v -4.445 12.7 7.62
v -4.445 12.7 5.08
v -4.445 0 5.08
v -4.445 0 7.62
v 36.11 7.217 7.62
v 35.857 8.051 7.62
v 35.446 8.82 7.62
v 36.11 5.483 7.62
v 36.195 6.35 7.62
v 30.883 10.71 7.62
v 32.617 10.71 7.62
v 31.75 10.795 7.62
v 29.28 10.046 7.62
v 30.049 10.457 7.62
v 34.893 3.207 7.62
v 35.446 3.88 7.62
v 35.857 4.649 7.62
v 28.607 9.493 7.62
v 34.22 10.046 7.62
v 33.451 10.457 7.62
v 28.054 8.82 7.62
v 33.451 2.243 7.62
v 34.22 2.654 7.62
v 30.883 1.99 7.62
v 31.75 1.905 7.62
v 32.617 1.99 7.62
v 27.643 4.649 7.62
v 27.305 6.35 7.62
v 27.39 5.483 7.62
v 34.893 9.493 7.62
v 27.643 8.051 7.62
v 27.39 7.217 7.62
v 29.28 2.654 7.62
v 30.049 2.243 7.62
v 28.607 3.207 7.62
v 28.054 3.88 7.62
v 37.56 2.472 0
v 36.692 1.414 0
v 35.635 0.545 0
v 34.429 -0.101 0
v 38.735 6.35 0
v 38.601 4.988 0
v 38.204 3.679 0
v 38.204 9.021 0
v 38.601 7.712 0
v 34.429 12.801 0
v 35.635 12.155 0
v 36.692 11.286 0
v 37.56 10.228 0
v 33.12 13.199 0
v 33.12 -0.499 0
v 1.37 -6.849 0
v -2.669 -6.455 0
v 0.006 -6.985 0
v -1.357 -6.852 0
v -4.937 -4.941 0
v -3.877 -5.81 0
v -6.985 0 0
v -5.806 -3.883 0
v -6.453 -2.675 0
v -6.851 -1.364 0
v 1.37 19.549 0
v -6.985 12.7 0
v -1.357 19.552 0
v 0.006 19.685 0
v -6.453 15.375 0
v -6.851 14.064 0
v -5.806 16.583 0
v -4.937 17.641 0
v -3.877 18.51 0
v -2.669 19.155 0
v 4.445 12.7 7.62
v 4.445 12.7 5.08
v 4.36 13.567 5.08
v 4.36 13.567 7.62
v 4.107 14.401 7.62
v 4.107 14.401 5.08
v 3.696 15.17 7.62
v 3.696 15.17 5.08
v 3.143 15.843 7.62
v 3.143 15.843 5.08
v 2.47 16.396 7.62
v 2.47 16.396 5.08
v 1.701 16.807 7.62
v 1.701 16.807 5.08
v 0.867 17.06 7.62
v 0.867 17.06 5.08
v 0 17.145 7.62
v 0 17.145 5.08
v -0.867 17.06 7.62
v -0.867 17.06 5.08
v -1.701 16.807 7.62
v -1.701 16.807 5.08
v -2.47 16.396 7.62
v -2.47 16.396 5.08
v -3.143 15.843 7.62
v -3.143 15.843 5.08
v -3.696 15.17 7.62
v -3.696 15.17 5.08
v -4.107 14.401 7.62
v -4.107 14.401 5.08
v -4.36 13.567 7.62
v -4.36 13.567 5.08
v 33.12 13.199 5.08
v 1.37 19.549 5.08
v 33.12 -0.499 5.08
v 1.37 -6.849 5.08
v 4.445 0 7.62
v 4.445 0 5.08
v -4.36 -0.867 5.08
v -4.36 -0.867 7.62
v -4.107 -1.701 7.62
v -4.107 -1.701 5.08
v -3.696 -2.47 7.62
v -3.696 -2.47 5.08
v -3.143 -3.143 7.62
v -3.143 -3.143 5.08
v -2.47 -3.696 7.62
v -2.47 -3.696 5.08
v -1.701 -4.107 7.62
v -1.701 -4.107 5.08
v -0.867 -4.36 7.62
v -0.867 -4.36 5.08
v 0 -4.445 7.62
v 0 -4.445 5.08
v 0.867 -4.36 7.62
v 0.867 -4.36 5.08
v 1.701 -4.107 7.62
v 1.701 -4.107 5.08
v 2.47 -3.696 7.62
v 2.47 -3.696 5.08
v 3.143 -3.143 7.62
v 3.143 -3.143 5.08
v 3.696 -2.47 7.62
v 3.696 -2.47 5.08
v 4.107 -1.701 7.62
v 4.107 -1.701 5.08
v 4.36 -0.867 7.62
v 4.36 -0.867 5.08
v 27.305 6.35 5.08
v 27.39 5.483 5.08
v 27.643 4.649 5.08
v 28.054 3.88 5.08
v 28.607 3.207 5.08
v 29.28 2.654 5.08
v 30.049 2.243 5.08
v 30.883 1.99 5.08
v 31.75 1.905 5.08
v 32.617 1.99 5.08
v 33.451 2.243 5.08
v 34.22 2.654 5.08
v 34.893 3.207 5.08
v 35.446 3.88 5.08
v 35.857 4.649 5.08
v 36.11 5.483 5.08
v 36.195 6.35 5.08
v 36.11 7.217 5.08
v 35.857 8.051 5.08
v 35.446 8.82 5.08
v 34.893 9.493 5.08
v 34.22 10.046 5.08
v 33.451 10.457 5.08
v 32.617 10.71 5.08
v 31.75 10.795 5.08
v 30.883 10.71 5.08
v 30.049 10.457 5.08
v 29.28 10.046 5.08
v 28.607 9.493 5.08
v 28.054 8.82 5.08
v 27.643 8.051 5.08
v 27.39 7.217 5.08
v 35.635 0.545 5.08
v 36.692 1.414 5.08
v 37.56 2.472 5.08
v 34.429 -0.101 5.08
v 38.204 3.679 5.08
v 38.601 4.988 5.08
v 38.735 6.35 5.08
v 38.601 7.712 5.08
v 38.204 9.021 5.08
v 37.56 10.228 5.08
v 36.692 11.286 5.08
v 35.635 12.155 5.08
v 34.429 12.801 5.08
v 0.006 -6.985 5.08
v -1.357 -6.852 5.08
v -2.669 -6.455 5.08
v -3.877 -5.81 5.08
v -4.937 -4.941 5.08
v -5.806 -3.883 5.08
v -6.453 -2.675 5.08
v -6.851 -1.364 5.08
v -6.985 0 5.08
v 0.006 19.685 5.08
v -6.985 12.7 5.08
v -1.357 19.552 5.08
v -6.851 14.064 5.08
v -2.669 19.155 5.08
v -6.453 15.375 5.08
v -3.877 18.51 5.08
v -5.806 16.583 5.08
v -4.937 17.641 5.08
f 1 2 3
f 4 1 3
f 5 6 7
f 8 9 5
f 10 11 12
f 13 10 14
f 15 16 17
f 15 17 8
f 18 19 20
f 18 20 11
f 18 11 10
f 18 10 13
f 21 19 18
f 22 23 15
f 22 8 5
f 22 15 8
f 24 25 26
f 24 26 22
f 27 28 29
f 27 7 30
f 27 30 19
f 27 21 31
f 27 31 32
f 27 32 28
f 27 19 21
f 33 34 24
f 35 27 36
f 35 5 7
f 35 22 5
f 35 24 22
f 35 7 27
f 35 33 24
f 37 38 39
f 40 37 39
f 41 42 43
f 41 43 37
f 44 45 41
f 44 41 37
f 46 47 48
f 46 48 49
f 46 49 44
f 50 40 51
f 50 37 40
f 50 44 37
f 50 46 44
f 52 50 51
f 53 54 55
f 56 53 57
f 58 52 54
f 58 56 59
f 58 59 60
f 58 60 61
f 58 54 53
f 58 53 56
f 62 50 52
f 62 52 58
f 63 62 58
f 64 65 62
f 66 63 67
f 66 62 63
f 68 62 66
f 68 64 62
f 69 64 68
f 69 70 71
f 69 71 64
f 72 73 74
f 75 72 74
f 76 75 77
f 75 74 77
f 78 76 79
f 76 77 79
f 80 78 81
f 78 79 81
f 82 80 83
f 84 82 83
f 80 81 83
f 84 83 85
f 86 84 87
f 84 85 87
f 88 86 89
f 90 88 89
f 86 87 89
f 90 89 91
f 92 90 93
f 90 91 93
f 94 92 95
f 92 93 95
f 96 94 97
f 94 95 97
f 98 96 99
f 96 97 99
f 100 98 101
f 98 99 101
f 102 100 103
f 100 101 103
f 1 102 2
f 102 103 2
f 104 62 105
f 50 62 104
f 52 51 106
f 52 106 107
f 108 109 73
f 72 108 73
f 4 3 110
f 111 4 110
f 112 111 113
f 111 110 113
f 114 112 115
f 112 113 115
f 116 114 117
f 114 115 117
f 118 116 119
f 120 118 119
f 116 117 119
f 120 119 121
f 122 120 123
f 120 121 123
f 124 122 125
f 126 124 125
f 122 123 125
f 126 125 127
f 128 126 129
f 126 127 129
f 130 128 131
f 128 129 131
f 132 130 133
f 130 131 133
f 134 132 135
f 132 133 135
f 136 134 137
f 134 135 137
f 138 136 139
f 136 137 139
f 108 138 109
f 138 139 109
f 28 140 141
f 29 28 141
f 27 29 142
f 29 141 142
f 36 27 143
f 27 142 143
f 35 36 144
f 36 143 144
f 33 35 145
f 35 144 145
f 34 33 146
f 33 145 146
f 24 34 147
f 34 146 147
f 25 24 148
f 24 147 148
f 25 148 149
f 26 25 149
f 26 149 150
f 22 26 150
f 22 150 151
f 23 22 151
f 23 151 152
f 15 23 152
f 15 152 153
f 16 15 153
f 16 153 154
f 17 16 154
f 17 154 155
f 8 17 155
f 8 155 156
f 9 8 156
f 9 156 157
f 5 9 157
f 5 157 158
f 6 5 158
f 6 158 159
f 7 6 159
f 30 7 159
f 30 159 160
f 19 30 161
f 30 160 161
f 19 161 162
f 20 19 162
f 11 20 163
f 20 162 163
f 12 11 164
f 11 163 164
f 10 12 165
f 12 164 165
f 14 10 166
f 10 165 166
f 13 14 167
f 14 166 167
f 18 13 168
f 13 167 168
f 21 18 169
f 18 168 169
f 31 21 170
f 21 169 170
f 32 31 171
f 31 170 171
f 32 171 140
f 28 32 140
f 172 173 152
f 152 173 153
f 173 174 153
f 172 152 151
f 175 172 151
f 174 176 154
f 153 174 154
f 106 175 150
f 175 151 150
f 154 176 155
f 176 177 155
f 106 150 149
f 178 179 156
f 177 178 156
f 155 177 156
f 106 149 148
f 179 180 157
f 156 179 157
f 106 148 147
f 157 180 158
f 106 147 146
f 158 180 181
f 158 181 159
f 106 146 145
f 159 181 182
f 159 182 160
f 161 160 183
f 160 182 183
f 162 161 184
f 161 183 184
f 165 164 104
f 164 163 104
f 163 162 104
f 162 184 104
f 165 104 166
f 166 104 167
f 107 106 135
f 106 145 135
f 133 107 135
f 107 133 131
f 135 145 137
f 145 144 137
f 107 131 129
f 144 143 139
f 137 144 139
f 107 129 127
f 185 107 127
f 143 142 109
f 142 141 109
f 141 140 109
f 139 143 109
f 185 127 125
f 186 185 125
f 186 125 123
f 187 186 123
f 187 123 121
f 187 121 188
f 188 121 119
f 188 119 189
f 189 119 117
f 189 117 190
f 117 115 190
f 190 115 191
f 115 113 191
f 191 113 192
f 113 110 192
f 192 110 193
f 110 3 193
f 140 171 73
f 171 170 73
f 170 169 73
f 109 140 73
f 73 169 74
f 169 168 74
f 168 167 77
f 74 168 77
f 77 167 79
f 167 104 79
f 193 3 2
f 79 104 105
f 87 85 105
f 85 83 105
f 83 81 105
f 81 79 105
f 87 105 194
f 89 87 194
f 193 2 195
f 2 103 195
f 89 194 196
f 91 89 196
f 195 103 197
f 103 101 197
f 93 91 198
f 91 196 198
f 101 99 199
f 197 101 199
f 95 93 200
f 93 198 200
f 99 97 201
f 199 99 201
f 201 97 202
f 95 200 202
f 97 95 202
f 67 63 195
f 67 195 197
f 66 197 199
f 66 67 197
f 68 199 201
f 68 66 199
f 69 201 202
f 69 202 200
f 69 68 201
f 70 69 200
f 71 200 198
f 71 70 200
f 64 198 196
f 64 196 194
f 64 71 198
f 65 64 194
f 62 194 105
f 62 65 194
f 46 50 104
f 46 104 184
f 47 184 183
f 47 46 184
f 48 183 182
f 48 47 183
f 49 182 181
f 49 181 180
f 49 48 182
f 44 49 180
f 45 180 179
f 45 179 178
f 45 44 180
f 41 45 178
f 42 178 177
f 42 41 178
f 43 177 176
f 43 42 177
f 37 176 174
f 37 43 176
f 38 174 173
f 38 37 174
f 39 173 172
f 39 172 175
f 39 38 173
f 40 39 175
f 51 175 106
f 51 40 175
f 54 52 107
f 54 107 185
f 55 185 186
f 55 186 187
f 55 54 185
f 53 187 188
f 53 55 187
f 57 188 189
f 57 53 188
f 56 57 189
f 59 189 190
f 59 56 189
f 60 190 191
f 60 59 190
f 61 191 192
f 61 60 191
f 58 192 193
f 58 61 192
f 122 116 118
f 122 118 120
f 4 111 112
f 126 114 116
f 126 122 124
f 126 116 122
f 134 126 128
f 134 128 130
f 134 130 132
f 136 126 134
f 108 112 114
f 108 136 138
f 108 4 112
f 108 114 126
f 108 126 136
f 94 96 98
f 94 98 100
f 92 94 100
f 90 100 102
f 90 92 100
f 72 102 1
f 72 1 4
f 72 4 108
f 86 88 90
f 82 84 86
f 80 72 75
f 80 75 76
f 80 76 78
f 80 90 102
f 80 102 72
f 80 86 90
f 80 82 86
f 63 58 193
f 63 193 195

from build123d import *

# Parameters (mm, degrees)
SKETCH1_R           = 4.445
BOSS_EXTRUDE1_DEPTH = 5.08
SKETCH1_8_R         = 4.445
BOSS_EXTRUDE2_DEPTH = 7.62


with BuildPart() as part:
    # Sketch1 → Boss-Extrude1 (new body)
    with BuildSketch(Plane.XY):
        with BuildLine():
            Line((-6.985, 0), (-6.985001912, 12.7))
            ThreePointArc((-6.985001912, 12.7), (-4.428413558, 18.101796467), (1.369871983, 19.549357814))
            Line((1.369871983, 19.549357814), (33.119871608, 13.199355939))
            ThreePointArc((33.119871608, 13.199355939), (38.735, 6.349999683), (33.119870986, -0.499356063))
            Line((33.119870986, -0.499356063), (1.369870986, -6.849355012))
            ThreePointArc((1.369870986, -6.849355012), (-4.428412185, -5.401794068), (-6.985, 0))
        make_face()
        with Locations((31.75, 6.35)):
            Circle(SKETCH1_R, mode=Mode.SUBTRACT)
        with BuildLine():
            Line((-4.445, 0), (-4.445, 12.7))
            ThreePointArc((-4.445, 12.7), (0, 17.145), (4.445, 12.7))
            Line((4.445, 12.7), (4.445, 0))
            ThreePointArc((4.445, 0), (0, -4.445), (-4.445, 0))
        make_face(mode=Mode.SUBTRACT)
    extrude(amount=BOSS_EXTRUDE1_DEPTH)

    # Sketch1<8> → Boss-Extrude2 (add)
    with BuildSketch(Plane.XY):
        with BuildLine():
            Line((-4.445, 12.7), (-4.445, 0))
            ThreePointArc((-4.445, 0), (0, -4.445), (4.445, 0))
            Line((4.445, 0), (4.445, 12.7))
            ThreePointArc((4.445, 12.7), (0, 17.145), (-4.445, 12.7))
        make_face()
        with Locations((31.75, 6.35)):
            Circle(SKETCH1_8_R)
    extrude(amount=BOSS_EXTRUDE2_DEPTH)


solid = part.part
